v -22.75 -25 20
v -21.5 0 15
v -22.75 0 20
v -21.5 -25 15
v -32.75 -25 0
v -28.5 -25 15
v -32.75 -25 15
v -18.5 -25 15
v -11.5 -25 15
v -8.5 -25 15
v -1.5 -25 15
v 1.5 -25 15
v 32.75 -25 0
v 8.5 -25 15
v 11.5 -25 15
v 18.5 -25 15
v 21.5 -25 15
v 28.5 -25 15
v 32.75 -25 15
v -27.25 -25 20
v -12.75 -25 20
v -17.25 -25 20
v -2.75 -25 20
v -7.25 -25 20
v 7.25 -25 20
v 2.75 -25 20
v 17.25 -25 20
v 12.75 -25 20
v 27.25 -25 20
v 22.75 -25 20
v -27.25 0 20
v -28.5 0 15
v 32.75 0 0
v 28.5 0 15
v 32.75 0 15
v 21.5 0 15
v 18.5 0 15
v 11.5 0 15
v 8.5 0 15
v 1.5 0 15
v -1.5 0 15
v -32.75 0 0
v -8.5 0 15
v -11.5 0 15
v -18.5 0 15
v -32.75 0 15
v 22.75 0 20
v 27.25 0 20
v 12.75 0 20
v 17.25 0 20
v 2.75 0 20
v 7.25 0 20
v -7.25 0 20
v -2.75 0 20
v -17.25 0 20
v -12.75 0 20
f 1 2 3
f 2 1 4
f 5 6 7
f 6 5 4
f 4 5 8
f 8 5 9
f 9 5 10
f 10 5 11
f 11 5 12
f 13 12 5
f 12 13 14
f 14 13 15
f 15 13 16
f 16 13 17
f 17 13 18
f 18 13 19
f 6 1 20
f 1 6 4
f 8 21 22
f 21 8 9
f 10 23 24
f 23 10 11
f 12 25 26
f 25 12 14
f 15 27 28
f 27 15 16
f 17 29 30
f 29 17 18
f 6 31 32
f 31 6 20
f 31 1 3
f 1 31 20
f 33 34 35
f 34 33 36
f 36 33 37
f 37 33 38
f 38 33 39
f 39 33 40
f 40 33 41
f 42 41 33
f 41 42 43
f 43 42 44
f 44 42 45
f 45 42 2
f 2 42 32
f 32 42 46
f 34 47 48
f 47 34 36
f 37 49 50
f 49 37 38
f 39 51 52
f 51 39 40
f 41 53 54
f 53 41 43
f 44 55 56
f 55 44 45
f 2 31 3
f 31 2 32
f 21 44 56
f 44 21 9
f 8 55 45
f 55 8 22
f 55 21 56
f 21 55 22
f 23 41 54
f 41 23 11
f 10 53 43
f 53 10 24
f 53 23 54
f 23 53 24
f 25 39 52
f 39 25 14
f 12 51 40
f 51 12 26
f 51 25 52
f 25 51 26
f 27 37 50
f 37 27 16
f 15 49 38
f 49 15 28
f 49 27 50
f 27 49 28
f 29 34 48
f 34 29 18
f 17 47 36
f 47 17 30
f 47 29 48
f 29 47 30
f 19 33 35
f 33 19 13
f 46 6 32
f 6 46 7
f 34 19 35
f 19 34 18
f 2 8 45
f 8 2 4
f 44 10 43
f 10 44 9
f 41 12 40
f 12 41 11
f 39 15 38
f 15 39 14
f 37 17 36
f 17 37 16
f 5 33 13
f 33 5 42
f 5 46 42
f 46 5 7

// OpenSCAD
$fn = 32;

// ----------------------------------------------------------------------
// Toothed rack, 6 teeth
// 10 mm pitch, 5 mm teeth
// ----------------------------------------------------------------------

// --- parameters (mm) ---
bar_w = 25;     // bar width (Y)
bar_h = 15;     // bar height (Z)
teeth = 6;      // number of teeth
pitch = 10;     // tooth pitch
tooth_h = 5;    // tooth height above the bar
root_w = 7.5;   // tooth width at the root
crest_w = 4.5;  // tooth width at the crest

// --- derived feature positions (mm) ---
span = (teeth - 1) * pitch;  // = 50   distance between the outer teeth
bar_l = span + root_w + 8;   // = 65.5   bar length: teeth plus 4 mm at each end
tooth_x = -span / 2;         // = -25   X of the first tooth
height = bar_h + tooth_h;    // = 20   overall height
feature_centers = [
  [tooth_x + 0 * pitch, -bar_w / 2],
  [tooth_x + 1 * pitch, -bar_w / 2],
  [tooth_x + 2 * pitch, -bar_w / 2],
  [tooth_x + 3 * pitch, -bar_w / 2],
  [tooth_x + 4 * pitch, -bar_w / 2],
  [tooth_x + 5 * pitch, -bar_w / 2]
];   // tooth centre line, drives the tooth loop

// bar with a rack of teeth, one extruded trapezoium per centre
module rack_tooth() {
  linear_extrude(height = bar_w)
    polygon(points = [
      [0, 0],
      [root_w, 0],
      [root_w / 2 + crest_w / 2, tooth_h + 1],
      [root_w / 2 - crest_w / 2, tooth_h + 1]
    ]);
}

union() {
  translate([-bar_l / 2, -bar_w, 0]) cube([bar_l, bar_w, bar_h]);
  for (centre = feature_centers)
    translate([centre[0] - root_w / 2, 0, bar_h - 1]) rotate([90, 0, 0]) rack_tooth();
}
